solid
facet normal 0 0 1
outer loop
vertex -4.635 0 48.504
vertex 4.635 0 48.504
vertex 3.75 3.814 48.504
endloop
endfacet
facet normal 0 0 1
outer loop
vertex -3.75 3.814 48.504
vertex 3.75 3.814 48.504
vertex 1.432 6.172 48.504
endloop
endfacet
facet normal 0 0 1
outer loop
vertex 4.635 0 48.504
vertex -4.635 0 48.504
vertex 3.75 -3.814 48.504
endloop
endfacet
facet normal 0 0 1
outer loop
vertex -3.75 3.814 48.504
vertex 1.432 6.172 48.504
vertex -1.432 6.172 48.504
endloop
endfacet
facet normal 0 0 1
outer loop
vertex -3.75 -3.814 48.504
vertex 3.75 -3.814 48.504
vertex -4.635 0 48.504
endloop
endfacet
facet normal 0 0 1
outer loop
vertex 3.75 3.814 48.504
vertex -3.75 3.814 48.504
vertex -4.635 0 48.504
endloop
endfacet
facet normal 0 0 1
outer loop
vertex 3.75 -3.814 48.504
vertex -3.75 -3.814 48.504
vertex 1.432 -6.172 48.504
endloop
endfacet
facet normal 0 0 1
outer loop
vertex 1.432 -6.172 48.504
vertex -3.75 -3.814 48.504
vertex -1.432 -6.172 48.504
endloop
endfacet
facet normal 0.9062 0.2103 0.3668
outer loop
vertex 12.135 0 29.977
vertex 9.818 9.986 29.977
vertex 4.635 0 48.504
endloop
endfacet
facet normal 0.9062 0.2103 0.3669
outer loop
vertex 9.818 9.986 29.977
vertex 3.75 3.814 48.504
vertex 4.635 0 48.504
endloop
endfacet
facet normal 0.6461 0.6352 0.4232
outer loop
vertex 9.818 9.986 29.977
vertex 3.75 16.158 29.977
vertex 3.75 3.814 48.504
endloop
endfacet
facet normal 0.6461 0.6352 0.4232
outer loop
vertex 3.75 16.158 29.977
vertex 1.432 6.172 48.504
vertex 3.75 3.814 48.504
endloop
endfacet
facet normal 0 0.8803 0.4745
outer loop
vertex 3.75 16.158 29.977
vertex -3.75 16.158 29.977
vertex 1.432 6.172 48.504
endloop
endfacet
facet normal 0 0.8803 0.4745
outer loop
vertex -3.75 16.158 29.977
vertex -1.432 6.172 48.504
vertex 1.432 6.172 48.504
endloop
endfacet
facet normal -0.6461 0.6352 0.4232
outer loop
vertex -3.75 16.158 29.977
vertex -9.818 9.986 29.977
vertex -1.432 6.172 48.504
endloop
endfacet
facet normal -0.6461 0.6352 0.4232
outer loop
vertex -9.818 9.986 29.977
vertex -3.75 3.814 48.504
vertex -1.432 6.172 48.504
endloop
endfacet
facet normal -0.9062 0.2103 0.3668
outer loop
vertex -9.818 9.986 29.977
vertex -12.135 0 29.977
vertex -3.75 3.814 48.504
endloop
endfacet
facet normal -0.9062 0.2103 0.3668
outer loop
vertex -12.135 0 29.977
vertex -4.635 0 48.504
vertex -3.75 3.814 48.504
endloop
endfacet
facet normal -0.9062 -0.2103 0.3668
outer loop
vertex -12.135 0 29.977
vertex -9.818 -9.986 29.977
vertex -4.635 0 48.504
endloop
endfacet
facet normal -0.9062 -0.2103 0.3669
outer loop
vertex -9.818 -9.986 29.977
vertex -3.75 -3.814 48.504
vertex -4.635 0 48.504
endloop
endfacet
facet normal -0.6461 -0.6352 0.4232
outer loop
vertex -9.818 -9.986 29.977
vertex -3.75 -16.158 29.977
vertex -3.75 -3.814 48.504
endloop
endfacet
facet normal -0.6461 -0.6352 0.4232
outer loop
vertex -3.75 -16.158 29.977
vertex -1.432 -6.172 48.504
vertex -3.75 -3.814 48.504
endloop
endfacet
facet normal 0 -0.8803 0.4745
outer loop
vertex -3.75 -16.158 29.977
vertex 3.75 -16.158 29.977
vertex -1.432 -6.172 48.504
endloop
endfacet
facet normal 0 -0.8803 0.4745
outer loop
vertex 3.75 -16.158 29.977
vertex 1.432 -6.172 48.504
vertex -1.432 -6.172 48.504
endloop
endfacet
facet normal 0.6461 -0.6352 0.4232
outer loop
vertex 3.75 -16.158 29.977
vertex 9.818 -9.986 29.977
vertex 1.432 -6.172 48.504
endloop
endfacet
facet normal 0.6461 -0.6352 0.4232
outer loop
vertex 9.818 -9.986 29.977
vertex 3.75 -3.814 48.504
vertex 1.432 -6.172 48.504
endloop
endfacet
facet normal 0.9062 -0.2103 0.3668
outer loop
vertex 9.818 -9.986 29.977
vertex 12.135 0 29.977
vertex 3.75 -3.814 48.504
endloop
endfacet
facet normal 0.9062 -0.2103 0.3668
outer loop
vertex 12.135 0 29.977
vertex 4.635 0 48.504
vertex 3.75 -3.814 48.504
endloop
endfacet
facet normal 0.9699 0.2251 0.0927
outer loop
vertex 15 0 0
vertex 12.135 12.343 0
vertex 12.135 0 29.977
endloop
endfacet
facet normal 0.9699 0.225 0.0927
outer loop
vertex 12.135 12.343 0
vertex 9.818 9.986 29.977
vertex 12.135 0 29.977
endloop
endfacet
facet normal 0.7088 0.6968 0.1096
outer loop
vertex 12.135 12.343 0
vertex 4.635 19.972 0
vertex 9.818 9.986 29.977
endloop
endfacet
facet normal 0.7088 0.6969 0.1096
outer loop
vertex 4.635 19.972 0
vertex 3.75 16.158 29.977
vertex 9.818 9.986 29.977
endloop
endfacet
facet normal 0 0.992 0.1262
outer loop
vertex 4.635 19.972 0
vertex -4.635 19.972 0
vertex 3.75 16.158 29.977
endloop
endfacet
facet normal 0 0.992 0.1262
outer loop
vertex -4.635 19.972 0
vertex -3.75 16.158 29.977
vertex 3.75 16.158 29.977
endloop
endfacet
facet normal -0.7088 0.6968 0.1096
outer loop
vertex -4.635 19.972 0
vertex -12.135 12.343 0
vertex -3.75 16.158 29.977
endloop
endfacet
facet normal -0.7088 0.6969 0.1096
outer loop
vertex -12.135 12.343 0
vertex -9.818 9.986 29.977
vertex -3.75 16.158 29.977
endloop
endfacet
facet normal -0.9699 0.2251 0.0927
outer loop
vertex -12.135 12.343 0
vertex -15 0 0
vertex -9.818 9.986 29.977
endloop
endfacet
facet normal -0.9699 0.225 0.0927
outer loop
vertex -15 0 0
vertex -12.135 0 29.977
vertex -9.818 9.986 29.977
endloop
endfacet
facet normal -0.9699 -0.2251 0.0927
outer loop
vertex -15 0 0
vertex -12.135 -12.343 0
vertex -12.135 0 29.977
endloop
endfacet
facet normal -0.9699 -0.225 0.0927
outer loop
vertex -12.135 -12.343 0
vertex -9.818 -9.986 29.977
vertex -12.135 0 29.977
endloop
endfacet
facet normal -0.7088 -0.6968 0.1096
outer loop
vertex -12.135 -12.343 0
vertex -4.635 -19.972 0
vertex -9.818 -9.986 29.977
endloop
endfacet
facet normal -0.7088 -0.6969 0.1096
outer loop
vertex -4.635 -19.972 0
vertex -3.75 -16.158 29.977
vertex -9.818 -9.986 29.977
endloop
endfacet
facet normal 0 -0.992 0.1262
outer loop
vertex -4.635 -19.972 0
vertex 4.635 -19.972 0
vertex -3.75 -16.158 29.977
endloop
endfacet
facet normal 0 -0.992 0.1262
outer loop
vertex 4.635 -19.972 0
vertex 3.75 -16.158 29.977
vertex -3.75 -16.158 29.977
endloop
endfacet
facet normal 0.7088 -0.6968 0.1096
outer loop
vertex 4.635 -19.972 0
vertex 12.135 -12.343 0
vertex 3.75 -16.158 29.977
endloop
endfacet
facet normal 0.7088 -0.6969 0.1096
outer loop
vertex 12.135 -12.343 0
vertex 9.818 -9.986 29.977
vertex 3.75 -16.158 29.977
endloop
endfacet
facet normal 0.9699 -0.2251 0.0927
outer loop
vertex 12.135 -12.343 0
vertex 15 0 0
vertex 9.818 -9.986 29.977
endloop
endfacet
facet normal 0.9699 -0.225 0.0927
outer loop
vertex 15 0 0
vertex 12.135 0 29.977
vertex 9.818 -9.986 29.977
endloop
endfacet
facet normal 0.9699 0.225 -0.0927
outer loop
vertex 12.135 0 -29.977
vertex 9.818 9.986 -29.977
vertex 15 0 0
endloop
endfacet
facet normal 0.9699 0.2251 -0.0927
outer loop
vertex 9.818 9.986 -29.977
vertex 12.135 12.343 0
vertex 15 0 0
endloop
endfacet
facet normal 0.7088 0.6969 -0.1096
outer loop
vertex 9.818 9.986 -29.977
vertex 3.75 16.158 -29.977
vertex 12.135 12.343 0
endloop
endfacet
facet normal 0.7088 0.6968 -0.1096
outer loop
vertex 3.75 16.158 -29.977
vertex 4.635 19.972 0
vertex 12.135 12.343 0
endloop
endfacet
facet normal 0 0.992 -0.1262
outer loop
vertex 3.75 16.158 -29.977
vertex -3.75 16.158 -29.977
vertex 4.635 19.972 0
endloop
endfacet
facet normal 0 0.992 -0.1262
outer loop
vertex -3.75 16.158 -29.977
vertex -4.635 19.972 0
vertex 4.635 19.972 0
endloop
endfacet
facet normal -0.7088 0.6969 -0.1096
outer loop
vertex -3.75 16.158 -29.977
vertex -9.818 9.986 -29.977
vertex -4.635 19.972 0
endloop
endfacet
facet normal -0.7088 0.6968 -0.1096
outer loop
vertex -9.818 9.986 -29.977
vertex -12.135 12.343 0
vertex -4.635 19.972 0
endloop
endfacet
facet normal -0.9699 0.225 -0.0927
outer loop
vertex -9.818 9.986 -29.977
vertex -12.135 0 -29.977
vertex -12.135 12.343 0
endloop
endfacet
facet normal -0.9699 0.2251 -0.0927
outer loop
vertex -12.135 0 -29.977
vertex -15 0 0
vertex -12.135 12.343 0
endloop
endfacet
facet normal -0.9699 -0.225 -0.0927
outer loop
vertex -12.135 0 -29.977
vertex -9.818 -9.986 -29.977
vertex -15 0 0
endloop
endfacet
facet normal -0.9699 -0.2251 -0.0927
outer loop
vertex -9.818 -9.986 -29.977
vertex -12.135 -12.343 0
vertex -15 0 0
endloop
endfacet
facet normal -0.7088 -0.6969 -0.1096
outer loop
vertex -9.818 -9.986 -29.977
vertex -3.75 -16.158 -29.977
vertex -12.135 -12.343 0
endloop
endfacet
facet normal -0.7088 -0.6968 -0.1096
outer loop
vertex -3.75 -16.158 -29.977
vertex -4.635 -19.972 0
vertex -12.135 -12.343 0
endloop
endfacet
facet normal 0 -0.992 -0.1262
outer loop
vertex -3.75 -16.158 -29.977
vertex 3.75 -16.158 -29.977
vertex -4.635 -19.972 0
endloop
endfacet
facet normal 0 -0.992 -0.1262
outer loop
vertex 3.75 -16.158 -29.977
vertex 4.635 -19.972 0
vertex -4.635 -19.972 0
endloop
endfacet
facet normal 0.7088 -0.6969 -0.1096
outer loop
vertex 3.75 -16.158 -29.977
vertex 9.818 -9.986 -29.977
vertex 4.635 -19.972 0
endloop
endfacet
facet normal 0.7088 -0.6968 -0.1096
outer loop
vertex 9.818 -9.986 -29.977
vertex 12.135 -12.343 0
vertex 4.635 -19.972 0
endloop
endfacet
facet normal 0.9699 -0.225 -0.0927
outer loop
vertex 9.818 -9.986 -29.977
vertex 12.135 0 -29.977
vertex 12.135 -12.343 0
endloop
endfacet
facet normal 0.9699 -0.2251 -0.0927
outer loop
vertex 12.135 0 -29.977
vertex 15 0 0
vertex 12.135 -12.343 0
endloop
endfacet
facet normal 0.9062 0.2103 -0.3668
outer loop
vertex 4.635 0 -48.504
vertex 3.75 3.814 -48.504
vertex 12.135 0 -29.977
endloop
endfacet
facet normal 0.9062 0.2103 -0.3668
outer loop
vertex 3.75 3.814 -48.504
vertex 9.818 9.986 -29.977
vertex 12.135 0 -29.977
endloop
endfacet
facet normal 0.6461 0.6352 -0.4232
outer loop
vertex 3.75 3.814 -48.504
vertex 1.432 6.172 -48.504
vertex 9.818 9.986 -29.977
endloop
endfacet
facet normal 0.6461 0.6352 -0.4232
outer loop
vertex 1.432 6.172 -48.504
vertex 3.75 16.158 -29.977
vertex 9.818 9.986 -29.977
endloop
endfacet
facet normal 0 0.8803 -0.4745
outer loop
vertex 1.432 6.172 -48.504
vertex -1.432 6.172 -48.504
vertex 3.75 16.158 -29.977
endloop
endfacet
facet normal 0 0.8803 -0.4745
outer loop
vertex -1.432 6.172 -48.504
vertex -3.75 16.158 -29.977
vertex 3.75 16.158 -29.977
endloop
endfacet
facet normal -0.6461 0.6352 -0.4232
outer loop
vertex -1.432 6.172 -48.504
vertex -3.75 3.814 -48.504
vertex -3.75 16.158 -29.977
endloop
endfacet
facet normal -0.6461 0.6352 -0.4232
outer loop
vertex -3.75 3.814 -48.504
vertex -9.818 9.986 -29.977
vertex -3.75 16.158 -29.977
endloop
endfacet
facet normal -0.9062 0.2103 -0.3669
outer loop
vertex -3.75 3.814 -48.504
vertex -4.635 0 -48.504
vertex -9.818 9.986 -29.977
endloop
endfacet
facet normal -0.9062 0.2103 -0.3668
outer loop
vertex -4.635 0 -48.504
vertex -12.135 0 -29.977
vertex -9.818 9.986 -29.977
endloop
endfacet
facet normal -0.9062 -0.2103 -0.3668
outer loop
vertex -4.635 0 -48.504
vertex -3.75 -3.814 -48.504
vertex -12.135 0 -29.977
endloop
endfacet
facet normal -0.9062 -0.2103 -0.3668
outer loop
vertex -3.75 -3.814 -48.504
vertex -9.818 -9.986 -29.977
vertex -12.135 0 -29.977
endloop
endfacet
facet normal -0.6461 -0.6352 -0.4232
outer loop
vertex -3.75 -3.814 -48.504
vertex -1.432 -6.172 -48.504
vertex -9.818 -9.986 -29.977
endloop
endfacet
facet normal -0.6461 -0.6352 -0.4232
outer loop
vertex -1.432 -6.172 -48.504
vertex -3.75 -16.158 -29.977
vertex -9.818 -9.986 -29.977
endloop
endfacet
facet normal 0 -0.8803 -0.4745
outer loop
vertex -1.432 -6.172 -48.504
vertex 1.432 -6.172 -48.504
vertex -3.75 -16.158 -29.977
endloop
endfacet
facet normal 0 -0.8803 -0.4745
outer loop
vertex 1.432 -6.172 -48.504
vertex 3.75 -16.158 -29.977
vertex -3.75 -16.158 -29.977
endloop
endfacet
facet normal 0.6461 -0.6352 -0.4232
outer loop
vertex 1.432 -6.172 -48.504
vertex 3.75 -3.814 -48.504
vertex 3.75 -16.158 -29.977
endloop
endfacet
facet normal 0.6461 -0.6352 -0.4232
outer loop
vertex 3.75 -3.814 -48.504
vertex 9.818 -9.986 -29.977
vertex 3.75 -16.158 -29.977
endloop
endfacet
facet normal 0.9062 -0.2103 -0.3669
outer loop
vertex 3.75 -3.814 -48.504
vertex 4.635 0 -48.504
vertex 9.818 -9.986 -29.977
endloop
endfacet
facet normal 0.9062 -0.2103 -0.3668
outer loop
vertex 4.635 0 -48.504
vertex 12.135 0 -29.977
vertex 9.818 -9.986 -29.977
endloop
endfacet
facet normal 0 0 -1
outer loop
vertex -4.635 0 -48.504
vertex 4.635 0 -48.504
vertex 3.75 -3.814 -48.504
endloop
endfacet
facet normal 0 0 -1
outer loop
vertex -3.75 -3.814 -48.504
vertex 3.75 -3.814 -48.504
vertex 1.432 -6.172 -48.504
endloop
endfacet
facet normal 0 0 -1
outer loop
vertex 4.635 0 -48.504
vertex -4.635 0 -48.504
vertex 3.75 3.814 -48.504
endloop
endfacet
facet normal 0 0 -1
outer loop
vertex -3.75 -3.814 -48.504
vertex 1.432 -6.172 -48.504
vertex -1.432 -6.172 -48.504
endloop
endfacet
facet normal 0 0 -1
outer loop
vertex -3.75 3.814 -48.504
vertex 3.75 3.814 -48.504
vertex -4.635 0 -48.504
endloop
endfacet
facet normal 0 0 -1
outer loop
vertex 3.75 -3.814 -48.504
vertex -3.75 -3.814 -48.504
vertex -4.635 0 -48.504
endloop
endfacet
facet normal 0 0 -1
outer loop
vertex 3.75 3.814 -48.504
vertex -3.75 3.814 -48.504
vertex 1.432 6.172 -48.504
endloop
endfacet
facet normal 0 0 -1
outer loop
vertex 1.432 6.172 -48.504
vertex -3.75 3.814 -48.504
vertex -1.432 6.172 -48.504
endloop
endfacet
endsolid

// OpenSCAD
// Generated by SolidPython 1.0.1 on 2020-07-29 00:46:46


scale(v = [5, 7, 17]) {
	sphere(r = 3);
}
/***********************************************
*********      SolidPython code:      **********
************************************************
 
# import packages: SolidPython
from solid import *
from solid.utils import *
from itertools import chain, combinations, permutations


class Resize:

    def __init__(self, scad_file):
        self.scad_file = scad_file
        #self.scad_file = import_scad(scad_file)
        # cone/cylinder param:
        self.r1 = 0
        self.r2 = 0
        self.h = 0
        # rectangular prism param:
        self.w = 0
        self.l = 0
        # ellipse param:
        self.r = 0

    # import OpenScad code (file name corresponds to shape)


    # classify shape + parameters
    def assign(self, param1, param2, param3):
        if self.scad_file == 'cone.scad':
            self.r1 = param1
            self.r2 = param2
            self.h = param3
        elif self.scad_file == 'cylinder.scad':
            self.r1 = param1
            self.r2 = param2
            self.h = param3
        elif self.scad_file == 'rectangularPrism.scad':
            self.h = param1
            self.l = param2
            self.w = param3
        else:
            self.r = param1
            self.h = param2

    # resize parameters
    def iterate(self):
        x = range(3, 20, 2)
        i = 1
        if self.scad_file == 'cone.scad':
            tempList = list(permutations(x, 2))
            for temp in tempList:
                param1 = temp[0]
                param2 = temp[1]
                filepath = 'produced_scad_files/' + 'cone' + str(param1) + '_' + str(param2) + '_' + '.scad'
                scad_render_to_file(cylinder(h=param1, r1=param2, r2=0), filepath)

        elif self.scad_file == 'cylinder.scad':
            tempList = list(permutations(x, 3))
            for temp in tempList:
                param1 = temp[0]
                param2 = temp[1]
                filepath = 'produced_scad_files/' + 'cylinder' + str(param1) + '_' + str(param2) + '_' + '.scad'
                scad_render_to_file(cylinder(h=param1, r1=param2, r2=param2), filepath)

        elif self.scad_file == 'rectangularPrism.scad':
            tempList = list(permutations(x, 3))
            for temp in tempList:
                param1 = temp[0]
                param2 = temp[1]
                param3 = temp[2]
                filepath = 'produced_scad_files/' + 'rectangularPrism' + str(param1) + '_' + str(param2) + '_' + str(
                    param3) + '.scad'
                scad_render_to_file(cube(size=(param1, param2, param3)), filepath)

        elif self.scad_file == 'ellipse.scad':
            tempList = list(permutations(x, 4))
            for temp in tempList:
                param1 = temp[0]
                param2 = temp[1]
                param3 = temp[2]
                param4 = temp[3]
                filepath = 'produced_scad_files/' + 'ellipse' + str(param1) + '_' + str(param2) + '_' + str(param3) + '_' + str(param4) + '.scad'
                scad_render_to_file(scale([param1, param2, param3])(sphere(r=param4)), filepath)

    def render_to_scadfile(self):
        scad_render_to_file(scad, 'example.scad') 
 
************************************************/
